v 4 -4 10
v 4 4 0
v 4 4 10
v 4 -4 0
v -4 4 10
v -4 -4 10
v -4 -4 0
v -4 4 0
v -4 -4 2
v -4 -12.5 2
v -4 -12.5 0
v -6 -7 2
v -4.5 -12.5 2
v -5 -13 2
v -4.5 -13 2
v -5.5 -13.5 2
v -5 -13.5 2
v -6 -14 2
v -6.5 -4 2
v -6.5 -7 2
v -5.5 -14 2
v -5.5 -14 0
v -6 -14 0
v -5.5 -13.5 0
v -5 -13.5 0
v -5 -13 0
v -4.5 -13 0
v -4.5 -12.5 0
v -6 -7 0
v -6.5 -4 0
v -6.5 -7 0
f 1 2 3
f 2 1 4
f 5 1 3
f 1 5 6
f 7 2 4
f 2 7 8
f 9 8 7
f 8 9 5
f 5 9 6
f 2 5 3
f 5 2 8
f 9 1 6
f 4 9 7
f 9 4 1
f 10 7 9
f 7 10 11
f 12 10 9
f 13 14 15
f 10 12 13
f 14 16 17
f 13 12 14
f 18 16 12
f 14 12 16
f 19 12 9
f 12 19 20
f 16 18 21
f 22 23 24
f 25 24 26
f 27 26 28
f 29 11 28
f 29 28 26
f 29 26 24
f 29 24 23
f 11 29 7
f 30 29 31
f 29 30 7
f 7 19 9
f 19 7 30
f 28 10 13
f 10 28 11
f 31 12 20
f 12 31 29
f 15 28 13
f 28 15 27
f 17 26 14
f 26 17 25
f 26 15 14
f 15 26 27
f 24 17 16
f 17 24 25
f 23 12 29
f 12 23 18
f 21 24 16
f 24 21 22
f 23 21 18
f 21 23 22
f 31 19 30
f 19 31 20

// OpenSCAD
translate([0, 0, 5]) color([0,1,0,0.9]) cube([8, 8, 10], center=true);
translate([-4.25, -4.25, 1]) color([1,0,0]) cube([0.5, 0.5, 2], center=true);
translate([-4.25, -4.75, 1]) color([1,0,0]) cube([0.5, 0.5, 2], center=true);
translate([-4.25, -5.25, 1]) color([1,0,0]) cube([0.5, 0.5, 2], center=true);
translate([-4.25, -5.75, 1]) color([1,0,0]) cube([0.5, 0.5, 2], center=true);
translate([-4.25, -6.25, 1]) color([1,0,0]) cube([0.5, 0.5, 2], center=true);
translate([-4.25, -6.75, 1]) color([1,0,0]) cube([0.5, 0.5, 2], center=true);
translate([-4.25, -7.25, 1]) color([1,0,0]) cube([0.5, 0.5, 2], center=true);
translate([-4.25, -7.75, 1]) color([1,0,0]) cube([0.5, 0.5, 2], center=true);
translate([-4.25, -8.25, 1]) color([1,0,0]) cube([0.5, 0.5, 2], center=true);
translate([-4.25, -8.75, 1]) color([1,0,0]) cube([0.5, 0.5, 2], center=true);
translate([-4.25, -9.25, 1]) color([1,0,0]) cube([0.5, 0.5, 2], center=true);
translate([-4.25, -9.75, 1]) color([1,0,0]) cube([0.5, 0.5, 2], center=true);
translate([-4.25, -10.25, 1]) color([1,0,0]) cube([0.5, 0.5, 2], center=true);
translate([-4.25, -10.75, 1]) color([1,0,0]) cube([0.5, 0.5, 2], center=true);
translate([-4.25, -11.25, 1]) color([1,0,0]) cube([0.5, 0.5, 2], center=true);
translate([-4.25, -11.75, 1]) color([1,0,0]) cube([0.5, 0.5, 2], center=true);
translate([-4.25, -12.25, 1]) color([1,0,0]) cube([0.5, 0.5, 2], center=true);
translate([-4.75, -4.25, 1]) color([1,0,0]) cube([0.5, 0.5, 2], center=true);
translate([-4.75, -4.75, 1]) color([1,0,0]) cube([0.5, 0.5, 2], center=true);
translate([-4.75, -5.25, 1]) color([1,0,0]) cube([0.5, 0.5, 2], center=true);
translate([-4.75, -5.75, 1]) color([1,0,0]) cube([0.5, 0.5, 2], center=true);
translate([-4.75, -6.25, 1]) color([1,0,0]) cube([0.5, 0.5, 2], center=true);
translate([-4.75, -6.75, 1]) color([1,0,0]) cube([0.5, 0.5, 2], center=true);
translate([-4.75, -7.25, 1]) color([1,0,0]) cube([0.5, 0.5, 2], center=true);
translate([-4.75, -7.75, 1]) color([1,0,0]) cube([0.5, 0.5, 2], center=true);
translate([-4.75, -8.25, 1]) color([1,0,0]) cube([0.5, 0.5, 2], center=true);
translate([-4.75, -8.75, 1]) color([1,0,0]) cube([0.5, 0.5, 2], center=true);
translate([-4.75, -9.25, 1]) color([1,0,0]) cube([0.5, 0.5, 2], center=true);
translate([-4.75, -9.75, 1]) color([1,0,0]) cube([0.5, 0.5, 2], center=true);
translate([-4.75, -10.25, 1]) color([1,0,0]) cube([0.5, 0.5, 2], center=true);
translate([-4.75, -10.75, 1]) color([1,0,0]) cube([0.5, 0.5, 2], center=true);
translate([-4.75, -11.25, 1]) color([1,0,0]) cube([0.5, 0.5, 2], center=true);
translate([-4.75, -11.75, 1]) color([1,0,0]) cube([0.5, 0.5, 2], center=true);
translate([-4.75, -12.25, 1]) color([1,0,0]) cube([0.5, 0.5, 2], center=true);
translate([-4.75, -12.75, 1]) color([1,0,0]) cube([0.5, 0.5, 2], center=true);
translate([-5.25, -4.25, 1]) color([1,0,0]) cube([0.5, 0.5, 2], center=true);
translate([-5.25, -4.75, 1]) color([1,0,0]) cube([0.5, 0.5, 2], center=true);
translate([-5.25, -5.25, 1]) color([1,0,0]) cube([0.5, 0.5, 2], center=true);
translate([-5.25, -5.75, 1]) color([1,0,0]) cube([0.5, 0.5, 2], center=true);
translate([-5.25, -6.25, 1]) color([1,0,0]) cube([0.5, 0.5, 2], center=true);
translate([-5.25, -6.75, 1]) color([1,0,0]) cube([0.5, 0.5, 2], center=true);
translate([-5.25, -7.25, 1]) color([1,0,0]) cube([0.5, 0.5, 2], center=true);
translate([-5.25, -7.75, 1]) color([1,0,0]) cube([0.5, 0.5, 2], center=true);
translate([-5.25, -8.25, 1]) color([1,0,0]) cube([0.5, 0.5, 2], center=true);
translate([-5.25, -8.75, 1]) color([1,0,0]) cube([0.5, 0.5, 2], center=true);
translate([-5.25, -9.25, 1]) color([1,0,0]) cube([0.5, 0.5, 2], center=true);
translate([-5.25, -9.75, 1]) color([1,0,0]) cube([0.5, 0.5, 2], center=true);
translate([-5.25, -10.25, 1]) color([1,0,0]) cube([0.5, 0.5, 2], center=true);
translate([-5.25, -10.75, 1]) color([1,0,0]) cube([0.5, 0.5, 2], center=true);
translate([-5.25, -11.25, 1]) color([1,0,0]) cube([0.5, 0.5, 2], center=true);
translate([-5.25, -11.75, 1]) color([1,0,0]) cube([0.5, 0.5, 2], center=true);
translate([-5.25, -12.25, 1]) color([1,0,0]) cube([0.5, 0.5, 2], center=true);
translate([-5.25, -12.75, 1]) color([1,0,0]) cube([0.5, 0.5, 2], center=true);
translate([-5.25, -13.25, 1]) color([1,0,0]) cube([0.5, 0.5, 2], center=true);
translate([-5.75, -4.25, 1]) color([1,0,0]) cube([0.5, 0.5, 2], center=true);
translate([-5.75, -4.75, 1]) color([1,0,0]) cube([0.5, 0.5, 2], center=true);
translate([-5.75, -5.25, 1]) color([1,0,0]) cube([0.5, 0.5, 2], center=true);
translate([-5.75, -5.75, 1]) color([1,0,0]) cube([0.5, 0.5, 2], center=true);
translate([-5.75, -6.25, 1]) color([1,0,0]) cube([0.5, 0.5, 2], center=true);
translate([-5.75, -6.75, 1]) color([1,0,0]) cube([0.5, 0.5, 2], center=true);
translate([-5.75, -7.25, 1]) color([1,0,0]) cube([0.5, 0.5, 2], center=true);
translate([-5.75, -7.75, 1]) color([1,0,0]) cube([0.5, 0.5, 2], center=true);
translate([-5.75, -8.25, 1]) color([1,0,0]) cube([0.5, 0.5, 2], center=true);
translate([-5.75, -8.75, 1]) color([1,0,0]) cube([0.5, 0.5, 2], center=true);
translate([-5.75, -9.25, 1]) color([1,0,0]) cube([0.5, 0.5, 2], center=true);
translate([-5.75, -9.75, 1]) color([1,0,0]) cube([0.5, 0.5, 2], center=true);
translate([-5.75, -10.25, 1]) color([1,0,0]) cube([0.5, 0.5, 2], center=true);
translate([-5.75, -10.75, 1]) color([1,0,0]) cube([0.5, 0.5, 2], center=true);
translate([-5.75, -11.25, 1]) color([1,0,0]) cube([0.5, 0.5, 2], center=true);
translate([-5.75, -11.75, 1]) color([1,0,0]) cube([0.5, 0.5, 2], center=true);
translate([-5.75, -12.25, 1]) color([1,0,0]) cube([0.5, 0.5, 2], center=true);
translate([-5.75, -12.75, 1]) color([1,0,0]) cube([0.5, 0.5, 2], center=true);
translate([-5.75, -13.25, 1]) color([1,0,0]) cube([0.5, 0.5, 2], center=true);
translate([-5.75, -13.75, 1]) color([1,0,0]) cube([0.5, 0.5, 2], center=true);
translate([-6.25, -4.25, 1]) color([1,0,0]) cube([0.5, 0.5, 2], center=true);
translate([-6.25, -4.75, 1]) color([1,0,0]) cube([0.5, 0.5, 2], center=true);
translate([-6.25, -5.25, 1]) color([1,0,0]) cube([0.5, 0.5, 2], center=true);
translate([-6.25, -5.75, 1]) color([1,0,0]) cube([0.5, 0.5, 2], center=true);
translate([-6.25, -6.25, 1]) color([1,0,0]) cube([0.5, 0.5, 2], center=true);
translate([-6.25, -6.75, 1]) color([1,0,0]) cube([0.5, 0.5, 2], center=true);
